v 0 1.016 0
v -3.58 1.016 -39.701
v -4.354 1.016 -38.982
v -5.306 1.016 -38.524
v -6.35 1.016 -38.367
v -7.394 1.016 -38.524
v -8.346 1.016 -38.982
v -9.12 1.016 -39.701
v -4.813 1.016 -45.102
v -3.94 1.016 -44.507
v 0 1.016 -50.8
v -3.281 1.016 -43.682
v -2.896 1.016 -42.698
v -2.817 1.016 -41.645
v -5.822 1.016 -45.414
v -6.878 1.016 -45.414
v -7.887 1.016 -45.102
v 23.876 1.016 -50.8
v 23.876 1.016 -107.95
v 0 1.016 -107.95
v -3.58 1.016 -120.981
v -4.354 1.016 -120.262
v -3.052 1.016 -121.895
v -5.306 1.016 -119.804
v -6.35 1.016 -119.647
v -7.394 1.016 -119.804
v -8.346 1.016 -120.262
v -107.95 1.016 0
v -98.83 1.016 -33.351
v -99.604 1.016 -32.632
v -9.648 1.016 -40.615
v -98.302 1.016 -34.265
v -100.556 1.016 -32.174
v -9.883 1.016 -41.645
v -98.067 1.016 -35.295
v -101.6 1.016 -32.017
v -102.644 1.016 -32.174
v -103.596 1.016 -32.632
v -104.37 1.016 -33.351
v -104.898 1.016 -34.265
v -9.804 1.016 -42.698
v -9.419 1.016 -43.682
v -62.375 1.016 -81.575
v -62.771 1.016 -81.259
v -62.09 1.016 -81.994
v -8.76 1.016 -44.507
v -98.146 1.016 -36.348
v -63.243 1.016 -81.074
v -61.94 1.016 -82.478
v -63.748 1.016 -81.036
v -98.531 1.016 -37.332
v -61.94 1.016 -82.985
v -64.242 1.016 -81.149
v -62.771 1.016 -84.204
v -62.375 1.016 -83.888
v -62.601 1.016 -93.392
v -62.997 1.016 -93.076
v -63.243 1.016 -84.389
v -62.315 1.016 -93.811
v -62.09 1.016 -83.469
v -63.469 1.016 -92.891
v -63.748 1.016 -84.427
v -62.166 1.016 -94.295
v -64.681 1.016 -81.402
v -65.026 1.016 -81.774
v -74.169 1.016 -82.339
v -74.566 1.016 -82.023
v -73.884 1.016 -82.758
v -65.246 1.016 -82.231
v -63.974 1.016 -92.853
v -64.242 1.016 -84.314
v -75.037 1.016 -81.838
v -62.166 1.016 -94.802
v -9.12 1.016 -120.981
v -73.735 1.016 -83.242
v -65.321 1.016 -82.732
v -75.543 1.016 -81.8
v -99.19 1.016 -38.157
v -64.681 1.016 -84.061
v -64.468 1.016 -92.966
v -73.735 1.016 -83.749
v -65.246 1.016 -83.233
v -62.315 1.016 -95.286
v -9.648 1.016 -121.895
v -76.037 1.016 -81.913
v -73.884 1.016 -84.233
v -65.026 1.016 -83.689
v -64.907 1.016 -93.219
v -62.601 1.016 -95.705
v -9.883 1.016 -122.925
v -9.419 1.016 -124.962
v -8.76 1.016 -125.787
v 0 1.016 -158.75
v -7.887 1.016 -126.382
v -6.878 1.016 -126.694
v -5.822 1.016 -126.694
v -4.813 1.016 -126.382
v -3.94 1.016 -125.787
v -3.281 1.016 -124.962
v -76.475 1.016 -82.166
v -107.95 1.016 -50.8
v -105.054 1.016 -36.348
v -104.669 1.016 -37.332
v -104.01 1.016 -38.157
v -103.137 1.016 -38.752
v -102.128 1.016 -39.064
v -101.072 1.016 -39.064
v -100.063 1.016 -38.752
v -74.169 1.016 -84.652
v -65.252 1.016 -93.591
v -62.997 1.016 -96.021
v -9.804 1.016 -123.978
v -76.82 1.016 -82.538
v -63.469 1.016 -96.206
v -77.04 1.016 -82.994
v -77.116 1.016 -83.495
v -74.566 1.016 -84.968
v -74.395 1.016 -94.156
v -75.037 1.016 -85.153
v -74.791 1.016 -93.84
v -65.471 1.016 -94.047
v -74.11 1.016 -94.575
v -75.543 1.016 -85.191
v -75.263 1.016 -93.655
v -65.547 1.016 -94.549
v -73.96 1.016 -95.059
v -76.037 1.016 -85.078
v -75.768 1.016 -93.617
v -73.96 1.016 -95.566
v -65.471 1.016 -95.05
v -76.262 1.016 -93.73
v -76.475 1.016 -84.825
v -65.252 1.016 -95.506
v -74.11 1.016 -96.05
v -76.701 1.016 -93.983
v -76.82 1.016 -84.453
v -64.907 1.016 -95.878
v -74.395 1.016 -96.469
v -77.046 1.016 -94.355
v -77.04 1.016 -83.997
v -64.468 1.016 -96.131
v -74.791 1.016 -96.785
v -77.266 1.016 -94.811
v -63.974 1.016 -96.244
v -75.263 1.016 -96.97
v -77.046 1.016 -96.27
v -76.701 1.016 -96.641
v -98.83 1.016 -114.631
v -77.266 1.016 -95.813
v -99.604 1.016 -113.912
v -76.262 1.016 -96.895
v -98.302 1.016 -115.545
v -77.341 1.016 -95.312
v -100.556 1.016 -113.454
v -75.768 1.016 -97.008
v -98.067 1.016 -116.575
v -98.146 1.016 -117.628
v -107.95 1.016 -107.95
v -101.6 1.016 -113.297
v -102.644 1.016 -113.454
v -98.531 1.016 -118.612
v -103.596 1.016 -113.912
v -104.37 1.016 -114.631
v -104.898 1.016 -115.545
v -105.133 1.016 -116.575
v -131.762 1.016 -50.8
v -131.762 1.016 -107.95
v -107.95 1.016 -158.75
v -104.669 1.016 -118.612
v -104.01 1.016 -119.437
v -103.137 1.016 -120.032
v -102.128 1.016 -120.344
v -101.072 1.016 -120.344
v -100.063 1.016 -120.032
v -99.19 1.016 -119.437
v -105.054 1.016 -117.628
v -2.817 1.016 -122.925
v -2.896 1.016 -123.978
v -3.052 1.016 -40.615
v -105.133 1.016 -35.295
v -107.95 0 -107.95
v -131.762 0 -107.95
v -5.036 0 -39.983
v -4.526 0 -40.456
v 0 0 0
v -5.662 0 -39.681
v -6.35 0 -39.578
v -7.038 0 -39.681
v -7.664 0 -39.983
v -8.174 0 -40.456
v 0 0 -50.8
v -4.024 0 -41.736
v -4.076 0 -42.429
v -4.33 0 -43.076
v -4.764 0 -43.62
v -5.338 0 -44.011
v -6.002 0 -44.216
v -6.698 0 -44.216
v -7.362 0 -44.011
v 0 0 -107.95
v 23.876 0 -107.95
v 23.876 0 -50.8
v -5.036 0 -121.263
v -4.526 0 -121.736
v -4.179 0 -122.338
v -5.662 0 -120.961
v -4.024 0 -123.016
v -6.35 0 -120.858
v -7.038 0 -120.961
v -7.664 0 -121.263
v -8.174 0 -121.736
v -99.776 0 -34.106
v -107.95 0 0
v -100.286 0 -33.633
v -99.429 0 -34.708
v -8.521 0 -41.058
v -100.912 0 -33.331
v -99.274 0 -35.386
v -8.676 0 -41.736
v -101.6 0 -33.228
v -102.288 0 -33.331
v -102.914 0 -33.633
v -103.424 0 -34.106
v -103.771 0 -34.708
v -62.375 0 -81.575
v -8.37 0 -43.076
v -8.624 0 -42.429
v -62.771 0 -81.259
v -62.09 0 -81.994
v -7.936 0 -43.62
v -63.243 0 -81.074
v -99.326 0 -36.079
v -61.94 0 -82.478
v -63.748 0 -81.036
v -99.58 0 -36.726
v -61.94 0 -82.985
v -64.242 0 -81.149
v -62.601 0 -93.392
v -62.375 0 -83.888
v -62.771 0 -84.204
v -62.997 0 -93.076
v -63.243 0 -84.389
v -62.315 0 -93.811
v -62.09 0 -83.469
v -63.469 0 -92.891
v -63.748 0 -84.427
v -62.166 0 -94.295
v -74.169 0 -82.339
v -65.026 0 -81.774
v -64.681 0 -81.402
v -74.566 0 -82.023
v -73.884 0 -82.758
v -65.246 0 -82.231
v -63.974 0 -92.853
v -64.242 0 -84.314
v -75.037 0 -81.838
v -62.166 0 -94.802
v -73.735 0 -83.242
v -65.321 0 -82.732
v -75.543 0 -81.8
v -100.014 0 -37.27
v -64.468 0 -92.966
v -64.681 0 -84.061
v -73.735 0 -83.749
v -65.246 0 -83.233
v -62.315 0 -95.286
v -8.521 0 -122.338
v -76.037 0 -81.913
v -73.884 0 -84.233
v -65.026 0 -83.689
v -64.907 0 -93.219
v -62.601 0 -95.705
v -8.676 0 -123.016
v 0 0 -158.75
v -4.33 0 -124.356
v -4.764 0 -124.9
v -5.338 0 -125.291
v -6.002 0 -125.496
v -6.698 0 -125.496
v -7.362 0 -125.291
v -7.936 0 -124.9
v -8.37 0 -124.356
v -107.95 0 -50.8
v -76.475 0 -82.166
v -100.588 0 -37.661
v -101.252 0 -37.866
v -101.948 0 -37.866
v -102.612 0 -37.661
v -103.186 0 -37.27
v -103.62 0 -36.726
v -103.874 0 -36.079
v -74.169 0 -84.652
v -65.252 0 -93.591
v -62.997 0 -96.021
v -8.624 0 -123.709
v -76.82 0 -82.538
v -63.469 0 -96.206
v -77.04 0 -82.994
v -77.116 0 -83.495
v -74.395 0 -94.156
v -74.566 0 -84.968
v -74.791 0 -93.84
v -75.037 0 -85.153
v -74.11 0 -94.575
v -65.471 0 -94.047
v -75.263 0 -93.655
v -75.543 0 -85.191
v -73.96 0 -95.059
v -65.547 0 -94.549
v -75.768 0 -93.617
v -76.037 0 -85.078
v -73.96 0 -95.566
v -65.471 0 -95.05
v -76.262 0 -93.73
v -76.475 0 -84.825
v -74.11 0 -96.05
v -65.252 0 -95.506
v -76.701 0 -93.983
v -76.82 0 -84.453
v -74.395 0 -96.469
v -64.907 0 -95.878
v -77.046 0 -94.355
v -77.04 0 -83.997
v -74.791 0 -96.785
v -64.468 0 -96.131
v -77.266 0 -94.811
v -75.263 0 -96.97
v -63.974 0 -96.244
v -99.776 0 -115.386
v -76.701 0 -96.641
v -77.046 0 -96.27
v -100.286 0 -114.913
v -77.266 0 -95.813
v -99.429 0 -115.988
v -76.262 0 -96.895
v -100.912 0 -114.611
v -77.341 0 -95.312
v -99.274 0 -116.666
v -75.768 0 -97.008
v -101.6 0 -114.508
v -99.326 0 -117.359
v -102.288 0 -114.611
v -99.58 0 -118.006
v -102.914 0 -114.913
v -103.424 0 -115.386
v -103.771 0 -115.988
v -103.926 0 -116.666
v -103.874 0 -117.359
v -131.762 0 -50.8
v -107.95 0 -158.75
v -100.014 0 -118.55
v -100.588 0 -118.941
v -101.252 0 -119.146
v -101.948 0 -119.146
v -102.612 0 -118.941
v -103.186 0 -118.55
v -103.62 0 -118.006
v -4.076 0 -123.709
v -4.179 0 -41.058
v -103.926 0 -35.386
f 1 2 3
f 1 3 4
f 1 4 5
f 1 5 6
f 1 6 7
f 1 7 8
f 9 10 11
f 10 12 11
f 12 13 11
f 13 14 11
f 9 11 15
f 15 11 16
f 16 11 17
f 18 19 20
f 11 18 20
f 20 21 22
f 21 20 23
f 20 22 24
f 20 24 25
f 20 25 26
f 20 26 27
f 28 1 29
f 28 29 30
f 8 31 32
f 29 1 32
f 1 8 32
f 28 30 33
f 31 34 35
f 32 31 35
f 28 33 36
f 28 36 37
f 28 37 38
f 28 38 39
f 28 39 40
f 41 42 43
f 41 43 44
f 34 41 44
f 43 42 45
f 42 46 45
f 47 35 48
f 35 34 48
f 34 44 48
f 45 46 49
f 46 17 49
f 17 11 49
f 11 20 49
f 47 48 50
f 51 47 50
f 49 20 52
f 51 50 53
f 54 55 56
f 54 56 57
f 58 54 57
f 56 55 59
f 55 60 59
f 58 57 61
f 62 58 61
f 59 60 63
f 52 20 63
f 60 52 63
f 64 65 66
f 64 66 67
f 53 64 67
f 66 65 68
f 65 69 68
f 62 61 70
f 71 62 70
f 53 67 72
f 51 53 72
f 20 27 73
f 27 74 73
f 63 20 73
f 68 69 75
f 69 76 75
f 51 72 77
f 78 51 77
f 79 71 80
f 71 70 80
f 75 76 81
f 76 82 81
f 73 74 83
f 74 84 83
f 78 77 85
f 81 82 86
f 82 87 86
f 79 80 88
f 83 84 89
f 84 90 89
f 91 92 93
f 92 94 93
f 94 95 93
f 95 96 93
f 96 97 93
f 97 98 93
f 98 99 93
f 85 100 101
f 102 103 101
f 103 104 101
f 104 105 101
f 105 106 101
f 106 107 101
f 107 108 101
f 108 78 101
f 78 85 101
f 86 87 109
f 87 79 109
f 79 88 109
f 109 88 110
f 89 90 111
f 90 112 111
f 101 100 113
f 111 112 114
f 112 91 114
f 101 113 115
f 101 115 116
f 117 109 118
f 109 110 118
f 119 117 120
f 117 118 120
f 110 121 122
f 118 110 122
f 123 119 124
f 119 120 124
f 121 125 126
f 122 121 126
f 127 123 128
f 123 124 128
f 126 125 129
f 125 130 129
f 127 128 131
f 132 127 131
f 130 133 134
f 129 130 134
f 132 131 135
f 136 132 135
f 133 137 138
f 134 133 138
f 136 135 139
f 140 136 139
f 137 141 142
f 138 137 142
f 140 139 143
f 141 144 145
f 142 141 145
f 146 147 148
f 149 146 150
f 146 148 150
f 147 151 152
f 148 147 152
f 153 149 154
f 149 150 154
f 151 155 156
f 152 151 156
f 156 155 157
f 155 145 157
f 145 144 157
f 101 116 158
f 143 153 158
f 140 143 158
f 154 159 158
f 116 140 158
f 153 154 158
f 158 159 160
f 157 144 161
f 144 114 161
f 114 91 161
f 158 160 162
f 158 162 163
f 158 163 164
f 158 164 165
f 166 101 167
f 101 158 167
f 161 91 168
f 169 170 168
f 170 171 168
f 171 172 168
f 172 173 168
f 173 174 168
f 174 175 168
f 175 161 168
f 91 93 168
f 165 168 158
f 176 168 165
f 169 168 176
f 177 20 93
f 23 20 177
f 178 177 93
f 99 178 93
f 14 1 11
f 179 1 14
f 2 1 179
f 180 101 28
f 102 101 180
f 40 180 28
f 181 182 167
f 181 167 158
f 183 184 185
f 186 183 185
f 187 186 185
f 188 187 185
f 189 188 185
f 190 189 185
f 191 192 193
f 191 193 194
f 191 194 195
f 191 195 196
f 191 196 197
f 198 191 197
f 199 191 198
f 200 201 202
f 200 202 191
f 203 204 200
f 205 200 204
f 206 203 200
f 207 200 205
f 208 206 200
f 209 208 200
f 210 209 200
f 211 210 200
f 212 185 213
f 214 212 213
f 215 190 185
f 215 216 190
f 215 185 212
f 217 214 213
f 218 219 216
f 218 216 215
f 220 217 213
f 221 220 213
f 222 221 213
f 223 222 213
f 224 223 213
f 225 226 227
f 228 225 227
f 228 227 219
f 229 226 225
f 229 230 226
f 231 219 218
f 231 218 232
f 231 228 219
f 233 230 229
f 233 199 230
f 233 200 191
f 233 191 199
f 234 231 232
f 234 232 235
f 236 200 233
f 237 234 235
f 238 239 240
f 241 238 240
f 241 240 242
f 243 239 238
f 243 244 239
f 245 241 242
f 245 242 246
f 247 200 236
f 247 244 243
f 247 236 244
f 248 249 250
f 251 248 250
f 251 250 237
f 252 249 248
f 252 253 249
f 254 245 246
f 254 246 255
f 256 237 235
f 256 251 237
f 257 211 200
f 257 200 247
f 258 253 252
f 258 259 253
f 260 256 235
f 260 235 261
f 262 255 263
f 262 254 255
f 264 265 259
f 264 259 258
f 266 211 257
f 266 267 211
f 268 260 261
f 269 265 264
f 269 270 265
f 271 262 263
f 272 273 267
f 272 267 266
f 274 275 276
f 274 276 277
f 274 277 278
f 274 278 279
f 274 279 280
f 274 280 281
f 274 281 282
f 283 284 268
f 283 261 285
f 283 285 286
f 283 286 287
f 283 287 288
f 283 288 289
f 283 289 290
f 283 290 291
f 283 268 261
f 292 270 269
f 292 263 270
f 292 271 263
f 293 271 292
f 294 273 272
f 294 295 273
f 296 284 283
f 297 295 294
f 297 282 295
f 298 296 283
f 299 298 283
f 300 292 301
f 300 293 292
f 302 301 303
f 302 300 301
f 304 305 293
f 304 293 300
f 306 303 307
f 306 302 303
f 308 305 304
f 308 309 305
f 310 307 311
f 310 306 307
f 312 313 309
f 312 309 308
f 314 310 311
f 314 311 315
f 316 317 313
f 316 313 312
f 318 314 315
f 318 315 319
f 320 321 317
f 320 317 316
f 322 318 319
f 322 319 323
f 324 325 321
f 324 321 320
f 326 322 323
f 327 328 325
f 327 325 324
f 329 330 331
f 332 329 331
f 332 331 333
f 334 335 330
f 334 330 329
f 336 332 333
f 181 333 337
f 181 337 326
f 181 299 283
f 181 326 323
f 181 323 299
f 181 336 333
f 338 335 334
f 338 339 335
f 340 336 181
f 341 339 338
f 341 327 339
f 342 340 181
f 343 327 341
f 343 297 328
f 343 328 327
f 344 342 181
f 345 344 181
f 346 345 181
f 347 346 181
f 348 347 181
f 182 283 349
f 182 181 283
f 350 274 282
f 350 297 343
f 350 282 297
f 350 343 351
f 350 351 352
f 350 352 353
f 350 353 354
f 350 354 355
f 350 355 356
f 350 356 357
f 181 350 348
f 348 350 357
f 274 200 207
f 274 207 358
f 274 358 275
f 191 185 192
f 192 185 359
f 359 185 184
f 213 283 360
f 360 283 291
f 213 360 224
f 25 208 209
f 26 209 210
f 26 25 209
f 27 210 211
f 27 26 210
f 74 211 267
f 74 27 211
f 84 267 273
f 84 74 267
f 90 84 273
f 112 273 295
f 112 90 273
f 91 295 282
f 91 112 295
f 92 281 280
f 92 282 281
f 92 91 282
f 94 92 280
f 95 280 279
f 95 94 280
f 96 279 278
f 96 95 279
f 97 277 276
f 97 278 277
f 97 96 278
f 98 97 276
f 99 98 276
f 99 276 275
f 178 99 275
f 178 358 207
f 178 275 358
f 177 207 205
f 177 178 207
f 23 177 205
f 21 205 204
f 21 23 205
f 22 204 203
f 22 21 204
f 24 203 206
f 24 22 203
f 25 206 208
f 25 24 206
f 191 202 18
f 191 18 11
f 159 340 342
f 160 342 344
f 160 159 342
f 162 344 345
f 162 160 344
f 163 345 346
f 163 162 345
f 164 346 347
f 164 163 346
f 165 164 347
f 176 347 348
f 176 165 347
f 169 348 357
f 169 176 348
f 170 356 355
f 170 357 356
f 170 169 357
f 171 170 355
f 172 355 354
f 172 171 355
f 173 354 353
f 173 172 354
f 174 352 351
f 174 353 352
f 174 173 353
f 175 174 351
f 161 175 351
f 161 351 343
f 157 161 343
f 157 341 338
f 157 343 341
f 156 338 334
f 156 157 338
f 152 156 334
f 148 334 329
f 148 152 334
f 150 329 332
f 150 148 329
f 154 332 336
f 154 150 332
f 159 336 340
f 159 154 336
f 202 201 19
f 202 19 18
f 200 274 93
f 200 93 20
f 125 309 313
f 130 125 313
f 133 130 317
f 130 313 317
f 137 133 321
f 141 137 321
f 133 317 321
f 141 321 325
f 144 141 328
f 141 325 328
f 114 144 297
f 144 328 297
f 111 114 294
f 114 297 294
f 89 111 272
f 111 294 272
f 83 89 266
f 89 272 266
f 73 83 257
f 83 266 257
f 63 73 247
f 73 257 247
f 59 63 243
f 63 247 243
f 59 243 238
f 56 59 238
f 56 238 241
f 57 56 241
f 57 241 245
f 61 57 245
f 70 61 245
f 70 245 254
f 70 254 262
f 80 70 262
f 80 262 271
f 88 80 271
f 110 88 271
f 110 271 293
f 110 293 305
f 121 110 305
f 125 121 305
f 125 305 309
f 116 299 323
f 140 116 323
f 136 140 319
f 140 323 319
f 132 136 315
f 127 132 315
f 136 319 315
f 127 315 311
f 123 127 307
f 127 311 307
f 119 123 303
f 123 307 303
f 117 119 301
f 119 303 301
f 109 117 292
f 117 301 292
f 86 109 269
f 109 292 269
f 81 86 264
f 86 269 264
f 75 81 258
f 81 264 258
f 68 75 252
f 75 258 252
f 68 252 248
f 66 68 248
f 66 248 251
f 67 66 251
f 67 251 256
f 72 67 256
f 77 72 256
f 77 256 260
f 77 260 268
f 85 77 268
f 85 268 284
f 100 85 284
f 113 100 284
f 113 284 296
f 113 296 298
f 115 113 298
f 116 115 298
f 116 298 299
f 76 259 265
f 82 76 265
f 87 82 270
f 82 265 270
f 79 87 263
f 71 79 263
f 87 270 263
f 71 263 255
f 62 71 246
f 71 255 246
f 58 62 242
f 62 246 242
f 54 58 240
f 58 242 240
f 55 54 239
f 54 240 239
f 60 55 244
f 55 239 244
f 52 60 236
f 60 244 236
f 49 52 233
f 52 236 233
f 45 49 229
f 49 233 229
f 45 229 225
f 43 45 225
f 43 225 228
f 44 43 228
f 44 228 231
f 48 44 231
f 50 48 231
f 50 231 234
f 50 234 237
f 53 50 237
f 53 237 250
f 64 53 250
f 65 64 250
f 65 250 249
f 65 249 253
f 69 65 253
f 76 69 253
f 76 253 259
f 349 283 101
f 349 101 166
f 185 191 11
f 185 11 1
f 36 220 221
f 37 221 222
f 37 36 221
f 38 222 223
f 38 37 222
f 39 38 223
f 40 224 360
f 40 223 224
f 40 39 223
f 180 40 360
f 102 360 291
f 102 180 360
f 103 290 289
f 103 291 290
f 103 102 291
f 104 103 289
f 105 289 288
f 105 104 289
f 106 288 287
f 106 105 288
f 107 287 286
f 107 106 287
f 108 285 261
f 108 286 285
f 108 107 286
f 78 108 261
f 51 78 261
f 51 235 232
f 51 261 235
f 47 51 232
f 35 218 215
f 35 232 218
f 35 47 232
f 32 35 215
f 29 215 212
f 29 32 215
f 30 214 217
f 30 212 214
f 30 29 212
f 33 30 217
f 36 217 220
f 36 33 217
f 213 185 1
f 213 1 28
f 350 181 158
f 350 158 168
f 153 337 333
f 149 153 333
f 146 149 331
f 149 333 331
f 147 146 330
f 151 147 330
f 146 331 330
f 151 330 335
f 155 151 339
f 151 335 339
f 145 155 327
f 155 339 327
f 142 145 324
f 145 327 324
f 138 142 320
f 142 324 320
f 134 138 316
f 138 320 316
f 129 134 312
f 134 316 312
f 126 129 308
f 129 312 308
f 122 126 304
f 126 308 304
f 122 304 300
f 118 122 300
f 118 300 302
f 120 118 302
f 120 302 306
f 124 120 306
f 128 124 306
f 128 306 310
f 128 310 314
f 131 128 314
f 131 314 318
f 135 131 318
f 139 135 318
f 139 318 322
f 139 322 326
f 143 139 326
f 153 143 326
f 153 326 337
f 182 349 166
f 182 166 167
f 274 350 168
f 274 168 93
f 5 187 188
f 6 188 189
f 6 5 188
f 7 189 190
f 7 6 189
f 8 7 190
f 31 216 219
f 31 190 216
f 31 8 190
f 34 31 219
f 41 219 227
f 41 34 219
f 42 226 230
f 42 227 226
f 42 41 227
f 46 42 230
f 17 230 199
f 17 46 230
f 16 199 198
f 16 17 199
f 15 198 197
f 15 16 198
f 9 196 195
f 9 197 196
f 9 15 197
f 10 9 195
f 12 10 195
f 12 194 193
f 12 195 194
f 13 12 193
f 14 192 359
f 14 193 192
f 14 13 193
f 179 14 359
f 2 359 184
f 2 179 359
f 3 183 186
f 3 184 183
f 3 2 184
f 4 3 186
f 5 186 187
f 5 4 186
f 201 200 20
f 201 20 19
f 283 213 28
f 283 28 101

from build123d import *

# Parameters (mm, degrees)
BOSS_EXTRUDE1_DEPTH                       = 1.016
CSK_FOR_6_FLAT_HEAD_MACHINE_SCREW_2_COUNT = 2
CSK_FOR_6_FLAT_HEAD_MACHINE_SCREW_2_PITCH = 95.461432003
CSK_FOR_6_FLAT_HEAD_MACHINE_SCREW_3_COUNT = 2
CSK_FOR_6_FLAT_HEAD_MACHINE_SCREW_3_PITCH = 121.190211651
CSK_FOR_6_FLAT_HEAD_MACHINE_SCREW_4_COUNT = 2
CSK_FOR_6_FLAT_HEAD_MACHINE_SCREW_4_PITCH = 81.28
M3_CLEARANCE_HOLE1_D                      = 3.4
M3_CLEARANCE_HOLE1_DEPTH                  = 20.066
M3_CLEARANCE_HOLE1_TIP                    = 1.021463052


with BuildPart() as part:
    # Sketch1 → Boss-Extrude1 (new body)
    with BuildSketch(Plane(origin=(0, 0, 0), x_dir=(1, 0, 0), z_dir=(0, 1, 0))):
        Polygon((-107.95, 50.8), (-131.7625, 50.8), (-131.7625, 107.95), (-107.95, 107.95), (-107.95, 158.75), (0, 158.75), (0, 107.95), (23.876, 107.95), (23.876, 50.8), (0, 50.8), (0, 0), (-107.95, 0), align=None)
    extrude(amount=BOSS_EXTRUDE1_DEPTH)

    # Sketch2 → CSK for #6 Flat Head Machine Screw (100)1 (revolve, cut)
    with BuildSketch(Plane(origin=(-101.6, 1.016, -116.84), x_dir=(0, 0, 1), z_dir=(1, 0, 0))):
        Polygon((0, 0), (0, 1.016), (1.89865, 1.016), (1.89865, 1.380025208), (3.5433, 0), align=None)
    csk_for_6_flat_head_machine_screw_100 = revolve(axis=Axis((-101.6, 7.366, -116.84), (0, -1, 0)), mode=Mode.SUBTRACT)

    # CSK for _6 Flat Head Machine Screw _ 2: CSK for #6 Flat Head Machine Screw (100)1 ×2
    with Locations(*[Vector(0.997785157856609, 0, -0.06651901052377401) * (i * CSK_FOR_6_FLAT_HEAD_MACHINE_SCREW_2_PITCH) for i in range(1, CSK_FOR_6_FLAT_HEAD_MACHINE_SCREW_2_COUNT)]):
        add(csk_for_6_flat_head_machine_screw_100, mode=Mode.SUBTRACT)

    # CSK for _6 Flat Head Machine Screw _ 3: CSK for #6 Flat Head Machine Screw (100)1 ×2
    with Locations(*[Vector(0.7859545643367972, 0, 0.6182842572782808) * (i * CSK_FOR_6_FLAT_HEAD_MACHINE_SCREW_3_PITCH) for i in range(1, CSK_FOR_6_FLAT_HEAD_MACHINE_SCREW_3_COUNT)]):
        add(csk_for_6_flat_head_machine_screw_100, mode=Mode.SUBTRACT)

    # CSK for _6 Flat Head Machine Screw _ 4: CSK for #6 Flat Head Machine Screw (100)1 ×2
    with Locations(*[(0, 0, i * CSK_FOR_6_FLAT_HEAD_MACHINE_SCREW_4_PITCH) for i in range(1, CSK_FOR_6_FLAT_HEAD_MACHINE_SCREW_4_COUNT)]):
        add(csk_for_6_flat_head_machine_screw_100, mode=Mode.SUBTRACT)

    # M3 Clearance Hole1
    with Locations(Plane(origin=(0, 1.016, 0), x_dir=(1, 0, 0), z_dir=(0, 1, 0))):
        with Locations((-63.846986831, 94.548500407), (-63.621171585, 82.731605313), (-75.641328415, 95.312377887), (-75.415513169, 83.495482793)):
            Hole(M3_CLEARANCE_HOLE1_D / 2, depth=M3_CLEARANCE_HOLE1_DEPTH)
            with Locations((0, 0, -(M3_CLEARANCE_HOLE1_DEPTH + M3_CLEARANCE_HOLE1_TIP / 2))):  # 118° drill point
                Cone(0, M3_CLEARANCE_HOLE1_D / 2, M3_CLEARANCE_HOLE1_TIP, mode=Mode.SUBTRACT)


solid = part.part
